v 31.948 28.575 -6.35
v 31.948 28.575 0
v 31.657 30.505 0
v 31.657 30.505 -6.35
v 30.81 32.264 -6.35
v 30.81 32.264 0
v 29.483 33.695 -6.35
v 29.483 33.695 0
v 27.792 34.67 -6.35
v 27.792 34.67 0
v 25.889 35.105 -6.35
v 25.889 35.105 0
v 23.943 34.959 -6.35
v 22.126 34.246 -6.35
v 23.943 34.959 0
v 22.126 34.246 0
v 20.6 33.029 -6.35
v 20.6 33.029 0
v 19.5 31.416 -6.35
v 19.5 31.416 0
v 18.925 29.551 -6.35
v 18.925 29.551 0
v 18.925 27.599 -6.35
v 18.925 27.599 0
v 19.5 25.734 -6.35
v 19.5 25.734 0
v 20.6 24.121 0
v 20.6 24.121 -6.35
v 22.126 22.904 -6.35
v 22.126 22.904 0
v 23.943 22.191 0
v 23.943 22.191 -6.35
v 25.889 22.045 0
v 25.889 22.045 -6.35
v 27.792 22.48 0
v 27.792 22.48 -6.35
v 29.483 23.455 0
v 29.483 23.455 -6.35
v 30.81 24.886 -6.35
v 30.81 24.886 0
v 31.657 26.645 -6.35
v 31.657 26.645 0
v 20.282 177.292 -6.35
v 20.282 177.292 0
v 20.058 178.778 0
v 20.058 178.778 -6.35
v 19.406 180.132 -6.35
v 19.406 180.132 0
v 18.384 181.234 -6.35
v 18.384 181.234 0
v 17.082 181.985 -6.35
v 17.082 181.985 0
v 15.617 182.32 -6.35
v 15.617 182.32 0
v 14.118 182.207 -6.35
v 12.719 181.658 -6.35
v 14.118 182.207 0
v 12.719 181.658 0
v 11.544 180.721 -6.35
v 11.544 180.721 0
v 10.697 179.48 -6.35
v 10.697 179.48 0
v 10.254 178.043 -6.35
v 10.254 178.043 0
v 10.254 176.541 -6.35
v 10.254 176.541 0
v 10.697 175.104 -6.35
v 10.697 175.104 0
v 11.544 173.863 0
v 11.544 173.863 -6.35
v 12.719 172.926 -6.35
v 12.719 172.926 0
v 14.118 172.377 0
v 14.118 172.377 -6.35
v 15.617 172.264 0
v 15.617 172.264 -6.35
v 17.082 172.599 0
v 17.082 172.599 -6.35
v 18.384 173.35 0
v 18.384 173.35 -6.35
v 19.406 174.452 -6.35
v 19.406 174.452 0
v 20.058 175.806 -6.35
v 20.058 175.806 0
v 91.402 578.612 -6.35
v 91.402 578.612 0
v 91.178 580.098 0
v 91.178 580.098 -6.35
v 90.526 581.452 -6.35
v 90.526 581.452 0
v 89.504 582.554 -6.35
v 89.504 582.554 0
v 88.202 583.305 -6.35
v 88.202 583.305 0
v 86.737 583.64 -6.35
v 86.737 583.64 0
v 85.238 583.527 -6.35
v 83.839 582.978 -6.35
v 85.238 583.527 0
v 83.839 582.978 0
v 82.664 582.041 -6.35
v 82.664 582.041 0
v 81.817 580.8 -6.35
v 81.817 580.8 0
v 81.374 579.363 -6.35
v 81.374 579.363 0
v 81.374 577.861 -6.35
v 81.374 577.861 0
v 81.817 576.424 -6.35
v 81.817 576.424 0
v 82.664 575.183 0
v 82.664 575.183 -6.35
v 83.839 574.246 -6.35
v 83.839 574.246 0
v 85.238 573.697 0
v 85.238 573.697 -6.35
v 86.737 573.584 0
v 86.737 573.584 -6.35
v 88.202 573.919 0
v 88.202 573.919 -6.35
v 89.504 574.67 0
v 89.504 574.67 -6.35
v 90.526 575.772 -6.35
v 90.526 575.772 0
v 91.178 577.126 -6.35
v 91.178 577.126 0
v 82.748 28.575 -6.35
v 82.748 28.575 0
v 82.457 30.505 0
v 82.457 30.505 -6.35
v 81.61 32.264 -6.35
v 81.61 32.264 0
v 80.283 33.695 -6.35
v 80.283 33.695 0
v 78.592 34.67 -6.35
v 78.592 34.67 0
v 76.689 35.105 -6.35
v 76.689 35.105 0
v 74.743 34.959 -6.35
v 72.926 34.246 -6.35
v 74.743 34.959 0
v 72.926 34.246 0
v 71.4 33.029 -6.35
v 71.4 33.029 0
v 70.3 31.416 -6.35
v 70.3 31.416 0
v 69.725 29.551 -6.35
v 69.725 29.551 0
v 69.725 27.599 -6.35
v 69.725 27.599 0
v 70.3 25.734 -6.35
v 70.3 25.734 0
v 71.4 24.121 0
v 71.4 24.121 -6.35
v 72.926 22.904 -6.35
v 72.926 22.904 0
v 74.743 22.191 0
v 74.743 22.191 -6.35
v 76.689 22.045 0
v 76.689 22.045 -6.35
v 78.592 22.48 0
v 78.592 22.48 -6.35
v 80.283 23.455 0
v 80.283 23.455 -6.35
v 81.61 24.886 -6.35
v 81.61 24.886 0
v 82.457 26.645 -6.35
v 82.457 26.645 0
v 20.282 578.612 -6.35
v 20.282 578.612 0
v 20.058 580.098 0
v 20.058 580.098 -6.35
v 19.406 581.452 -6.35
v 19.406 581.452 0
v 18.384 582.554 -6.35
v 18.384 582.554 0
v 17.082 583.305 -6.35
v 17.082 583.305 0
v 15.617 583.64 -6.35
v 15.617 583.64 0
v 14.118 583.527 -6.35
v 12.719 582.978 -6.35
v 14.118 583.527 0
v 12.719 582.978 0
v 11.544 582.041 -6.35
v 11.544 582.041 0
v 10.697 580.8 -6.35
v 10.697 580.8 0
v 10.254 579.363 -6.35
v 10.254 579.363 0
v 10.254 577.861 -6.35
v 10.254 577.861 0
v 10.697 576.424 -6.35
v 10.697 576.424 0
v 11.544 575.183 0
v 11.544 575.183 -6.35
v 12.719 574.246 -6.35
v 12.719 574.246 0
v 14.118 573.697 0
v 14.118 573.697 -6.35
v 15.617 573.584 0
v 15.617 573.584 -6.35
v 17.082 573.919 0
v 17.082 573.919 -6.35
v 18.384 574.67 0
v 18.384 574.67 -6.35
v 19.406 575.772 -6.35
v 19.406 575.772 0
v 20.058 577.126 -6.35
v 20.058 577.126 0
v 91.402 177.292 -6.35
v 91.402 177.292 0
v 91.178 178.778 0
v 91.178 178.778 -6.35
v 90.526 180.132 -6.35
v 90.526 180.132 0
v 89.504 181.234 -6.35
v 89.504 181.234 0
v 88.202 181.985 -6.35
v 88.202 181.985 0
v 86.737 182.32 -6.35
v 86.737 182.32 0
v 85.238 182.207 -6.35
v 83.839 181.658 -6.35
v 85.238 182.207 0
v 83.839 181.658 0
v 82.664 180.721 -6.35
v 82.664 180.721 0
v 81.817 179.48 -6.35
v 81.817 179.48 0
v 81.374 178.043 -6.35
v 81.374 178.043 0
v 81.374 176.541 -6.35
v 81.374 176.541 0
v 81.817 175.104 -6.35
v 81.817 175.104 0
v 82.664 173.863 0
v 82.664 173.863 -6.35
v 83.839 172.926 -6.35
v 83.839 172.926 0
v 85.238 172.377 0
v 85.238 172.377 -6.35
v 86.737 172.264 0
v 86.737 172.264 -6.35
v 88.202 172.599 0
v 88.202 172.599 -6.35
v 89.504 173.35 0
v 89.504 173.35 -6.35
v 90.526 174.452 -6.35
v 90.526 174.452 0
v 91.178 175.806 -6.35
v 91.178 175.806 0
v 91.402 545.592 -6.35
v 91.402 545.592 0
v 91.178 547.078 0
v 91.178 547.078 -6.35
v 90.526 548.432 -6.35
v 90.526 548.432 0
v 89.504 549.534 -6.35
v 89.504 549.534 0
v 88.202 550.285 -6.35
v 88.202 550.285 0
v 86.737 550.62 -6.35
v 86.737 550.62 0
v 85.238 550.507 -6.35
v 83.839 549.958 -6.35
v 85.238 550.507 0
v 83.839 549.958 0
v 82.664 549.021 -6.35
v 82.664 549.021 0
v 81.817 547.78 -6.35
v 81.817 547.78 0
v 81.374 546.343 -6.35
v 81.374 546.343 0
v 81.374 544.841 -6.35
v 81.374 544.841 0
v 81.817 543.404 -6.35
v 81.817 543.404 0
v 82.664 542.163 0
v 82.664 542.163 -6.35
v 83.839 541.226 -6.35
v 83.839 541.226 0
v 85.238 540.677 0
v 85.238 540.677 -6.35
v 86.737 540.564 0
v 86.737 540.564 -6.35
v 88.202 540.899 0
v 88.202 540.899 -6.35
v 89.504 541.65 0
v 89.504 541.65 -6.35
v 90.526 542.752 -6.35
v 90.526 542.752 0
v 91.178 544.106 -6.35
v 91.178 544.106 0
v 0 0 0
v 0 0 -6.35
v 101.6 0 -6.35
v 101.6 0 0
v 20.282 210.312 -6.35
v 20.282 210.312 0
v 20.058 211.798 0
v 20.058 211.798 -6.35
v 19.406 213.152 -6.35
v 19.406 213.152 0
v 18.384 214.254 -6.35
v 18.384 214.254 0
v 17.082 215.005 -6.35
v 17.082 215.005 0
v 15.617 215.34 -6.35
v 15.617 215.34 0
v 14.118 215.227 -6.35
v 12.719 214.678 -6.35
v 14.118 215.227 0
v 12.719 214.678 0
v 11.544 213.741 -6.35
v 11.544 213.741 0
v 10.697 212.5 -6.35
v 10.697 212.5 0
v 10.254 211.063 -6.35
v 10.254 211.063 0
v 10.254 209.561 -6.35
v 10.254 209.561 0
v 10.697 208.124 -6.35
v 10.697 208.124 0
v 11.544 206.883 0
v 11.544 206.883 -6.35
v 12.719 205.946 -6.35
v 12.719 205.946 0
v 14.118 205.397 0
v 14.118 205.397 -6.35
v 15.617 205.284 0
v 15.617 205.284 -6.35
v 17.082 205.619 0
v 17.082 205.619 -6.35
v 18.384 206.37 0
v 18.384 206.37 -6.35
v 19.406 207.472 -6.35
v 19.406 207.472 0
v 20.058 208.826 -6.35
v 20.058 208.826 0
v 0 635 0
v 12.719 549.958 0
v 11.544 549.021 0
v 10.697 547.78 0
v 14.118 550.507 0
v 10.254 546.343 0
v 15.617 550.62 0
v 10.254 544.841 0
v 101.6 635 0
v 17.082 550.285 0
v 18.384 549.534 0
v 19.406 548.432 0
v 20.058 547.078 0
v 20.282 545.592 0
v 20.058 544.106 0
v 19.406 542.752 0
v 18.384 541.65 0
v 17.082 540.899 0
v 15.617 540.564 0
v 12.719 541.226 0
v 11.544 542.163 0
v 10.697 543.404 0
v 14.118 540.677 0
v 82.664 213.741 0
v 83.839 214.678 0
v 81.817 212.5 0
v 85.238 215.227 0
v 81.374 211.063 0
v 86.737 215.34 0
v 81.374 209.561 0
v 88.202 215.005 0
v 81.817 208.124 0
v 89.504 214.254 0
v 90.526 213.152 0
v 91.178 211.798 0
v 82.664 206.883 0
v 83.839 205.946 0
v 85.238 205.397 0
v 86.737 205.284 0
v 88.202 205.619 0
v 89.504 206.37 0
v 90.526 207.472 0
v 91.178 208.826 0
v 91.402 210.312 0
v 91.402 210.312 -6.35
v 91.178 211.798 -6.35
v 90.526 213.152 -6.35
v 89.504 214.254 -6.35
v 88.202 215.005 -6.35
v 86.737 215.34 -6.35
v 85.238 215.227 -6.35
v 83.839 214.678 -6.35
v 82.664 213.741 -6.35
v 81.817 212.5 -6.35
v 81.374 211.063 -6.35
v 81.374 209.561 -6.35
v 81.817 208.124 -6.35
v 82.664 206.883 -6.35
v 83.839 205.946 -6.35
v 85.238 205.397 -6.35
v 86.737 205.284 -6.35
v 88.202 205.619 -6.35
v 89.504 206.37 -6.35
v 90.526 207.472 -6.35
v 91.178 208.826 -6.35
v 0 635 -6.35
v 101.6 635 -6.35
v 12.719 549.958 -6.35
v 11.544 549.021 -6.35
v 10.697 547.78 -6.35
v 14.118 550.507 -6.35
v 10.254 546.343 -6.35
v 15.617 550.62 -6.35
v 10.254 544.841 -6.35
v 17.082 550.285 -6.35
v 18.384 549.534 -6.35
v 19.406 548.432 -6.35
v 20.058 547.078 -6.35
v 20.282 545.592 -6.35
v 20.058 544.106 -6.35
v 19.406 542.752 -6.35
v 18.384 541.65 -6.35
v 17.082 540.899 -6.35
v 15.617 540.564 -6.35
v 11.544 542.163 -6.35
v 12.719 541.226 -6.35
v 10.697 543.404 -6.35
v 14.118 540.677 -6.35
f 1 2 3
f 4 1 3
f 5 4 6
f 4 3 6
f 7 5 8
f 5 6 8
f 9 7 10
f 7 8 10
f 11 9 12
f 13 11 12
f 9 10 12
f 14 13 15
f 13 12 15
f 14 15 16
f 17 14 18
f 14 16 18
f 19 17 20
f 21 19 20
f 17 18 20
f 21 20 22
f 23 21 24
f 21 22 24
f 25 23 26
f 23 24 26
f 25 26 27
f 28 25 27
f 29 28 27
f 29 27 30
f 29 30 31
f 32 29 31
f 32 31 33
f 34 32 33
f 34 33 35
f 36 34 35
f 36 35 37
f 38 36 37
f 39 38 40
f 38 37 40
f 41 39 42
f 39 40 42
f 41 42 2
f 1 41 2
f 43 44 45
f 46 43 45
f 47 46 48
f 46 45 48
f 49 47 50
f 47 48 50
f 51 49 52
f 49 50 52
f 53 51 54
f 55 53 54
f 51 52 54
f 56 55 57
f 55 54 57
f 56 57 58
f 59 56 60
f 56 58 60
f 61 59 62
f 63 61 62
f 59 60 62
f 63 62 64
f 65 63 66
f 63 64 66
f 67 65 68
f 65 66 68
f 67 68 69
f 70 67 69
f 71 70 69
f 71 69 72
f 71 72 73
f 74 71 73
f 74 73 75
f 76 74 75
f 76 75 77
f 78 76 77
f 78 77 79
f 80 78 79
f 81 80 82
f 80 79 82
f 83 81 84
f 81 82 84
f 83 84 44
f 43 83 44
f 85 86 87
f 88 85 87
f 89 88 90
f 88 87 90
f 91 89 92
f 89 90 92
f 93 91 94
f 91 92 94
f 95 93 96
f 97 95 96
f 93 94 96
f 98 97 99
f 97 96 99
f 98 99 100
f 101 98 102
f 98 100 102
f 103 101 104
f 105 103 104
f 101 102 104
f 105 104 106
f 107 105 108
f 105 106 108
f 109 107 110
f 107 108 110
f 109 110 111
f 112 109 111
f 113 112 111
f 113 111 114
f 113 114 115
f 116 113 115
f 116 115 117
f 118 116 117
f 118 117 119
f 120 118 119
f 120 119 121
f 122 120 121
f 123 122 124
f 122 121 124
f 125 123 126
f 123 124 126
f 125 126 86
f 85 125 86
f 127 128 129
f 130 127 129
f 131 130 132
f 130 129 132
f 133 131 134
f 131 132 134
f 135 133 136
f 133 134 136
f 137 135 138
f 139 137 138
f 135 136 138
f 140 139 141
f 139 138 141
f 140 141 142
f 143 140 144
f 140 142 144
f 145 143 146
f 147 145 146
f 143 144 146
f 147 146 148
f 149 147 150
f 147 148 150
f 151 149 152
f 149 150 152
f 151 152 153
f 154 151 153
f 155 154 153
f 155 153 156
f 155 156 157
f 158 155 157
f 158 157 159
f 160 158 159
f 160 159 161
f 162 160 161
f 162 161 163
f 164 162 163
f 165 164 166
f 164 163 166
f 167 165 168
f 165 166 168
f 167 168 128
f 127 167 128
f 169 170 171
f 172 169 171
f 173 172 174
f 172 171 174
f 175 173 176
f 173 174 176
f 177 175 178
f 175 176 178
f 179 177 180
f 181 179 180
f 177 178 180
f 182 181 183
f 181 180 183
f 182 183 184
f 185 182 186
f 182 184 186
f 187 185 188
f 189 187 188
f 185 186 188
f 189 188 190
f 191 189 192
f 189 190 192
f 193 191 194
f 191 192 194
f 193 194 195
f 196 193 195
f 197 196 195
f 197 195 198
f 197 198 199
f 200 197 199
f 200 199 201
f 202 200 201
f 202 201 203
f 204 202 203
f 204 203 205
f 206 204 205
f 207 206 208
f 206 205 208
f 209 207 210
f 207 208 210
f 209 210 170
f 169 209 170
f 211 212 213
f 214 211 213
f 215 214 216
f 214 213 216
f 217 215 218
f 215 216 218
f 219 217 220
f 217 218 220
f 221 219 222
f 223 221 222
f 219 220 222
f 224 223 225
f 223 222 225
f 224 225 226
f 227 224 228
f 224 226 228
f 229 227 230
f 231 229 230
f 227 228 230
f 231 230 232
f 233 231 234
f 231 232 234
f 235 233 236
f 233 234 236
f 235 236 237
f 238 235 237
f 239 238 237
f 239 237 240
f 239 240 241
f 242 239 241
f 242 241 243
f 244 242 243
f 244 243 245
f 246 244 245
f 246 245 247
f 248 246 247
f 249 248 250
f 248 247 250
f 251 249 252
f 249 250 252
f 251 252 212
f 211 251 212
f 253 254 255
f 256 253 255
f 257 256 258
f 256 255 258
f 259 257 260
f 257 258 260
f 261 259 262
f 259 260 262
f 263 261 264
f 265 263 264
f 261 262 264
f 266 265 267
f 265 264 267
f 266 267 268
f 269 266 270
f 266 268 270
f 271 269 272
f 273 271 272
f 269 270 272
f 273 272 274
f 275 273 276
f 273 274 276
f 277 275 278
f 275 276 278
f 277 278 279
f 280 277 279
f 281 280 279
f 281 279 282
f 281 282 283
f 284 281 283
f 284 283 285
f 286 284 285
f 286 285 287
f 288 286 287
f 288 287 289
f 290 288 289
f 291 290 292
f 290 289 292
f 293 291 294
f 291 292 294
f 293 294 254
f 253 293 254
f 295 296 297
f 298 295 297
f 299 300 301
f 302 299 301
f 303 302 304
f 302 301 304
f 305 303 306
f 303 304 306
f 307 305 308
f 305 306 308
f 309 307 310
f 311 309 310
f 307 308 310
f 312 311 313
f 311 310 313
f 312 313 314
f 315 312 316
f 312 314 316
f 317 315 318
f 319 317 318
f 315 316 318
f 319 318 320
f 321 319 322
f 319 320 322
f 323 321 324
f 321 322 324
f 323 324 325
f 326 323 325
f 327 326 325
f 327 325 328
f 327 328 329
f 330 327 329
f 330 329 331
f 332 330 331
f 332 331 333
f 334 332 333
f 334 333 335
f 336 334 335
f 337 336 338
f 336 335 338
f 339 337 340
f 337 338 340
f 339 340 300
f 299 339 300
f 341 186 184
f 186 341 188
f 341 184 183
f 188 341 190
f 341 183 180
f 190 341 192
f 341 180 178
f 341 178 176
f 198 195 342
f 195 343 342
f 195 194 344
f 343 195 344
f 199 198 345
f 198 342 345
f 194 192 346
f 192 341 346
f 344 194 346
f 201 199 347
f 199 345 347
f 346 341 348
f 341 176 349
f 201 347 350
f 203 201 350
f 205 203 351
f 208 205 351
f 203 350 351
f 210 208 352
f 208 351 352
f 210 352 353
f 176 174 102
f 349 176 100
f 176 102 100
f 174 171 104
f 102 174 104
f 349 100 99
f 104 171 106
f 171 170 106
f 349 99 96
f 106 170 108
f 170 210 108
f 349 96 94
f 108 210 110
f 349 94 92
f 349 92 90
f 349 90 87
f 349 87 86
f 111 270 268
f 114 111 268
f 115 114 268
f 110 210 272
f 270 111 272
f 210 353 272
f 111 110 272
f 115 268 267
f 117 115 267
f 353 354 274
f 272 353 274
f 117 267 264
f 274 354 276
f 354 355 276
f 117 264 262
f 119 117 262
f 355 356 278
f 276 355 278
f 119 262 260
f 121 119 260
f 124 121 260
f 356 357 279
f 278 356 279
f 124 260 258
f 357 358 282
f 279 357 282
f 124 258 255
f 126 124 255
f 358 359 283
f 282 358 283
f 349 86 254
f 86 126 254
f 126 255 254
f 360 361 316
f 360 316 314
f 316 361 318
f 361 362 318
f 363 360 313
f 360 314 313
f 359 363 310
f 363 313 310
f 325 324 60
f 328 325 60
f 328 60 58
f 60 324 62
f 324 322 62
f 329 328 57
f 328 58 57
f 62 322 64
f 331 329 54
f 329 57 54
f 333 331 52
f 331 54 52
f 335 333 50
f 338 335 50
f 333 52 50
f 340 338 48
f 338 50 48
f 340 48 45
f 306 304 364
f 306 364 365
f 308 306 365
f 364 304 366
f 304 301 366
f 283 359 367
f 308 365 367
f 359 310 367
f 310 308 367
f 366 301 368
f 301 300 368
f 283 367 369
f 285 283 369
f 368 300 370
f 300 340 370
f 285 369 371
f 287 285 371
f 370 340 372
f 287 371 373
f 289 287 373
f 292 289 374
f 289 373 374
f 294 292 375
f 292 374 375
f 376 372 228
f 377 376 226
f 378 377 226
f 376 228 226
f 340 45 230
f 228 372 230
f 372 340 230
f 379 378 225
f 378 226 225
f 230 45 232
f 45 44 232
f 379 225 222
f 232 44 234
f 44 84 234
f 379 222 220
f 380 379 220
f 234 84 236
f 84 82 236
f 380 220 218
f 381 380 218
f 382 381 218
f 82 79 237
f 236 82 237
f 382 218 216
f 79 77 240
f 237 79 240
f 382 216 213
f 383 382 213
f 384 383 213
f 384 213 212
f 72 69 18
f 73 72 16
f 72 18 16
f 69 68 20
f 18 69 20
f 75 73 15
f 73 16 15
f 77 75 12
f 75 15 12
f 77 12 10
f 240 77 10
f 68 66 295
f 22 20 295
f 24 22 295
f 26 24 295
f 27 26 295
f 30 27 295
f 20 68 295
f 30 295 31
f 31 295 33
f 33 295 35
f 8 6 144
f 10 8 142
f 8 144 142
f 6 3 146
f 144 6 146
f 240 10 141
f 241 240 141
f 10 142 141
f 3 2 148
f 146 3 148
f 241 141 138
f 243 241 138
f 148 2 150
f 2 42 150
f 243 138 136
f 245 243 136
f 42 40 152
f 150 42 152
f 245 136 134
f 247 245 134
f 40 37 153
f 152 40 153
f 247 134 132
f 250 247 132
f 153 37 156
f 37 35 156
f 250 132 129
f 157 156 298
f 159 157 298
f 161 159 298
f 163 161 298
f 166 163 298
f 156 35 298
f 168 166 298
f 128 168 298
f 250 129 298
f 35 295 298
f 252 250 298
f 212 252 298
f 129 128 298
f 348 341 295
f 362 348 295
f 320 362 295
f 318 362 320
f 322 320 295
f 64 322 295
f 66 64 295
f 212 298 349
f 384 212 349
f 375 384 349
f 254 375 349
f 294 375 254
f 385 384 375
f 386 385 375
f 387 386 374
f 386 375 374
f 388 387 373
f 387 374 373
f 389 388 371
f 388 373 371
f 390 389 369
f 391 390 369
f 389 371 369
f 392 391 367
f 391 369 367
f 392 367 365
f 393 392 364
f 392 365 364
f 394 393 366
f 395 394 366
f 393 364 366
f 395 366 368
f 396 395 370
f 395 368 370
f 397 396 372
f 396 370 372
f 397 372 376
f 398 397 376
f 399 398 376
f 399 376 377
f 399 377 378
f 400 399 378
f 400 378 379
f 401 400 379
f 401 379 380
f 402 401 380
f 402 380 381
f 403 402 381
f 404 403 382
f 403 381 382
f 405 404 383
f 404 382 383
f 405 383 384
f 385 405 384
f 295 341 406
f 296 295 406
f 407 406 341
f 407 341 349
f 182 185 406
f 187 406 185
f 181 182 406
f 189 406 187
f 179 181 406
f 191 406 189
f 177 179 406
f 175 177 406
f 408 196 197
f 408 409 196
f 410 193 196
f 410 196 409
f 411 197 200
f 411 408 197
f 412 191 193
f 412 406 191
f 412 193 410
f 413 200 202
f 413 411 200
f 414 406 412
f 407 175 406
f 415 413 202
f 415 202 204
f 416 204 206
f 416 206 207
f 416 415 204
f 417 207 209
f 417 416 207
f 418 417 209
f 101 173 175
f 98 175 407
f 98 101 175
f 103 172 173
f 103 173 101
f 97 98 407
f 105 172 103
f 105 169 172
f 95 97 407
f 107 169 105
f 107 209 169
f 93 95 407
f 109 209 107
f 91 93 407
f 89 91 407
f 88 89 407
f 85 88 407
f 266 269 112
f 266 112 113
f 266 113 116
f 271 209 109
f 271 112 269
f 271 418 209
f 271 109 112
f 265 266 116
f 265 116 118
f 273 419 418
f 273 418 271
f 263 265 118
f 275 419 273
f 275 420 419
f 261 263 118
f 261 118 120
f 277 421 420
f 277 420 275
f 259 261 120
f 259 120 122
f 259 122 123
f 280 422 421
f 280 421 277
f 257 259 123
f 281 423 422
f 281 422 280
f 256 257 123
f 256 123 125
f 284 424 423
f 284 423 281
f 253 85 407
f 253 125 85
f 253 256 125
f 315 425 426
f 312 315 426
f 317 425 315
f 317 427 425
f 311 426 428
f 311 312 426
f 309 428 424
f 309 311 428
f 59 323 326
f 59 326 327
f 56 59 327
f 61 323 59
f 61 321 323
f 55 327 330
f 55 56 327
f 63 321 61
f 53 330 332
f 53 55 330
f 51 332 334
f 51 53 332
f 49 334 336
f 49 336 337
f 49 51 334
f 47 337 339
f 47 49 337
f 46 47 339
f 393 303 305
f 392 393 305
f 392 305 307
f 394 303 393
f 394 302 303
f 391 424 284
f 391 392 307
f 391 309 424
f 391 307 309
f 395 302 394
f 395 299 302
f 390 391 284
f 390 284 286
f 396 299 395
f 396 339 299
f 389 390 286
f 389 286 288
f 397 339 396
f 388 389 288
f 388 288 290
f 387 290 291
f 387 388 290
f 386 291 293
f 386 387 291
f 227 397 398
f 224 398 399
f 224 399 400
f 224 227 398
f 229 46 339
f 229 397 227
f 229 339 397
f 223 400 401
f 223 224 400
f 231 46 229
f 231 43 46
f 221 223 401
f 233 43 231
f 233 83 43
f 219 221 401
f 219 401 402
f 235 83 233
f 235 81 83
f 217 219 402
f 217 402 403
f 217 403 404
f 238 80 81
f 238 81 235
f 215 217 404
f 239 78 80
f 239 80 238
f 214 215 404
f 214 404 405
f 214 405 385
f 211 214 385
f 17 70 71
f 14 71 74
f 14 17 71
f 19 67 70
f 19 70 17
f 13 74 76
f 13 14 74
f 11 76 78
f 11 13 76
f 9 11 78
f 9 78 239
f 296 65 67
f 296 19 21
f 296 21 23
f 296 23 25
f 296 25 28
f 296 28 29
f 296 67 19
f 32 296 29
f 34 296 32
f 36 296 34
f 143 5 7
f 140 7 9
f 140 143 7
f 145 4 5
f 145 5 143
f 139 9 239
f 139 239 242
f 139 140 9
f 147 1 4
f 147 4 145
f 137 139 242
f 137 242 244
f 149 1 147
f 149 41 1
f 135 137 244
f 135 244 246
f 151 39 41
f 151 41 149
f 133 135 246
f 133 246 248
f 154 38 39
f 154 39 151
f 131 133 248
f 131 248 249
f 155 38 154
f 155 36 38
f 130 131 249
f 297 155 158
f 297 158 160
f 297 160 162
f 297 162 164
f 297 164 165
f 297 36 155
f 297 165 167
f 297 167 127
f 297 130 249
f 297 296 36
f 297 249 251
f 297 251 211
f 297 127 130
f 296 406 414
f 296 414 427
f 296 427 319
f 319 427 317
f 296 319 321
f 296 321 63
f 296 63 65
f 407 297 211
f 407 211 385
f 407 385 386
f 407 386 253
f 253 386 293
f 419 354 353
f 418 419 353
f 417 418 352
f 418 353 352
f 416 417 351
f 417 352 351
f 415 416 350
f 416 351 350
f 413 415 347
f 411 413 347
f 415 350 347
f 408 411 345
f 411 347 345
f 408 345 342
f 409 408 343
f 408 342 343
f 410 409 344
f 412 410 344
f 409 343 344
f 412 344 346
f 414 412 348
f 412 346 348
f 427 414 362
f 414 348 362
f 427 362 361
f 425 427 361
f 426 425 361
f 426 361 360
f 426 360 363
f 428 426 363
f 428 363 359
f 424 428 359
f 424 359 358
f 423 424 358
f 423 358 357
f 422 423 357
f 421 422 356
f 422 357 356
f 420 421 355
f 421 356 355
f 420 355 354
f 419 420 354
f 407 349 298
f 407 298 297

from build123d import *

# Parameters (mm, degrees)
SKETCH1_W           = 101.6
SKETCH1_H           = 6.35
BOSS_EXTRUDE1_DEPTH = 635
SKETCH2_R           = 6.54812
SKETCH2_R_2         = 5.0419
CUT_EXTRUDE1_DEPTH  = 6.35


with BuildPart() as part:
    # Sketch1 → Boss-Extrude1 (new body)
    with BuildSketch(Plane(origin=(0, 0, 0), x_dir=(1, 0, 0), z_dir=(0, 1, 0))):
        with Locations((50.8, 3.175)):
            Rectangle(SKETCH1_W, SKETCH1_H)
    extrude(amount=BOSS_EXTRUDE1_DEPTH)

    # Sketch2 → Cut-Extrude1 (cut)
    with BuildSketch(Plane.XY):
        with Locations((25.4, 28.575)):
            Circle(SKETCH2_R)
        with Locations((76.2, 28.575)):
            Circle(SKETCH2_R)
        with Locations((15.24, 210.312)):
            Circle(SKETCH2_R_2)
        with Locations((86.36, 210.312)):
            Circle(SKETCH2_R_2)
        with Locations((15.24, 177.292)):
            Circle(SKETCH2_R_2)
        with Locations((86.36, 177.292)):
            Circle(SKETCH2_R_2)
        with Locations((15.24, 578.612)):
            Circle(SKETCH2_R_2)
        with Locations((15.24, 545.592)):
            Circle(SKETCH2_R_2)
        with Locations((86.36, 578.612)):
            Circle(SKETCH2_R_2)
        with Locations((86.36, 545.592)):
            Circle(SKETCH2_R_2)
    extrude(amount=-CUT_EXTRUDE1_DEPTH, mode=Mode.SUBTRACT)


solid = part.part
